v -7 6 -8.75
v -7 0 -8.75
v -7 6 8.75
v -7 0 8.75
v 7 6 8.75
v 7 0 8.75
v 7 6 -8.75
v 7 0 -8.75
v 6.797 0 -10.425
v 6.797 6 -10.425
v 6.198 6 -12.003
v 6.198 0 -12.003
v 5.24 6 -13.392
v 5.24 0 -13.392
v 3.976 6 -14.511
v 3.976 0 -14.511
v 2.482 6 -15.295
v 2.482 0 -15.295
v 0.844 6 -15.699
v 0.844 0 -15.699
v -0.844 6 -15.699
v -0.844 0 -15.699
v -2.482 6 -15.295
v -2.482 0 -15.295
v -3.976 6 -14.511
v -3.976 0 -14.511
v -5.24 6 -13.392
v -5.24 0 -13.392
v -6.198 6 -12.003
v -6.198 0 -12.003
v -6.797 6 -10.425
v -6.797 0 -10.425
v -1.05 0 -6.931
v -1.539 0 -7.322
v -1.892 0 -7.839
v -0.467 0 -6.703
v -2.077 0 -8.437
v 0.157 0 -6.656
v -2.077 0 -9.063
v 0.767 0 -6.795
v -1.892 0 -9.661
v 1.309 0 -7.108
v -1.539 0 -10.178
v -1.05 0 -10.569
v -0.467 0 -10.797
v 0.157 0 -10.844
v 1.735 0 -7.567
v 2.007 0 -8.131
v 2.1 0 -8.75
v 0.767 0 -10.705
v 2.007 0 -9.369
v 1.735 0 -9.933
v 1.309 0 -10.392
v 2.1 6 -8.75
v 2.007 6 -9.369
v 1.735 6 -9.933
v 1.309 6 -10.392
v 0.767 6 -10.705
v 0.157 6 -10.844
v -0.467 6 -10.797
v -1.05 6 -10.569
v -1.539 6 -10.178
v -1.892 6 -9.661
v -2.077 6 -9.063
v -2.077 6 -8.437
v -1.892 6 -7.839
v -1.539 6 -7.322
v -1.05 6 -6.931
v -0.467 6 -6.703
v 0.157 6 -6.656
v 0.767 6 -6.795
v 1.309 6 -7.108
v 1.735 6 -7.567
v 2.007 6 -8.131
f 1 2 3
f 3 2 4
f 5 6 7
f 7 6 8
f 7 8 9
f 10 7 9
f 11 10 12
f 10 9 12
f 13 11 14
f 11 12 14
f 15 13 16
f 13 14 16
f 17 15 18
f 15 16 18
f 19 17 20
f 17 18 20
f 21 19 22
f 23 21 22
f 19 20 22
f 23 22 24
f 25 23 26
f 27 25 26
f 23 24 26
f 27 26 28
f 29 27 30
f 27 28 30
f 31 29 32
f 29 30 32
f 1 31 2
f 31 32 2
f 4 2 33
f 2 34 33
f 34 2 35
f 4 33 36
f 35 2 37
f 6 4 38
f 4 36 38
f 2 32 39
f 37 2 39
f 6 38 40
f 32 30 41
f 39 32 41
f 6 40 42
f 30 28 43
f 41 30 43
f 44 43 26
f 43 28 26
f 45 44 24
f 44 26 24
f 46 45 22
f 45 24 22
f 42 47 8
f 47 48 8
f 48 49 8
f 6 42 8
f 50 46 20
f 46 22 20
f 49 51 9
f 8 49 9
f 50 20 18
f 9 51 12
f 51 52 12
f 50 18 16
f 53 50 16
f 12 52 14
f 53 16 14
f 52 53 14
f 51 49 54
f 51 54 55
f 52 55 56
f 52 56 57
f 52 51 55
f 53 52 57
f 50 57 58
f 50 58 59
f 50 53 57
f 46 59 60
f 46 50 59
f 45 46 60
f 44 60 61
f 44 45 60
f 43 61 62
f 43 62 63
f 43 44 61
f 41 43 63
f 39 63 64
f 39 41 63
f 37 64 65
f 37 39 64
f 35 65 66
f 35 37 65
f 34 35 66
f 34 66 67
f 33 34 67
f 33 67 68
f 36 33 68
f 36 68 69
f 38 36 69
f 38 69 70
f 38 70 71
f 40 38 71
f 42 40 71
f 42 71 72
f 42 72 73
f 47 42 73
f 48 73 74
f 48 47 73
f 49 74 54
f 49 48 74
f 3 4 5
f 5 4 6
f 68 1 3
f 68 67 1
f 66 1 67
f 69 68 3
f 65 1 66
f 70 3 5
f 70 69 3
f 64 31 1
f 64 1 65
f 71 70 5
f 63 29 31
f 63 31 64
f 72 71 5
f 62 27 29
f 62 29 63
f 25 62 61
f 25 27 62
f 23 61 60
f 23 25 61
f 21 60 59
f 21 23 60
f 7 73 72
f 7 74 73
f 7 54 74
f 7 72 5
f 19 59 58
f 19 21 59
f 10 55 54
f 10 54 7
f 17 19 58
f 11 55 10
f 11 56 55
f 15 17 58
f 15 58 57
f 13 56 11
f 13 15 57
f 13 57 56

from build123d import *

# Parameters (mm, degrees)
SKETCH1_R           = 2.1
BOSS_EXTRUDE1_DEPTH = 6


with BuildPart() as part:
    # Sketch1 → Boss-Extrude1 (new body)
    with BuildSketch(Plane(origin=(0, 0, 0), x_dir=(1, 0, 0), z_dir=(0, 1, 0))):
        with BuildLine():
            Line((-7, -8.75), (7, -8.75))
            Line((7, -8.75), (7, 8.75))
            ThreePointArc((7, 8.75), (0, 15.75), (-7, 8.75))
            Line((-7, 8.75), (-7, -8.75))
        make_face()
        with Locations((0, 8.75)):
            Circle(SKETCH1_R, mode=Mode.SUBTRACT)
    extrude(amount=BOSS_EXTRUDE1_DEPTH)


solid = part.part
